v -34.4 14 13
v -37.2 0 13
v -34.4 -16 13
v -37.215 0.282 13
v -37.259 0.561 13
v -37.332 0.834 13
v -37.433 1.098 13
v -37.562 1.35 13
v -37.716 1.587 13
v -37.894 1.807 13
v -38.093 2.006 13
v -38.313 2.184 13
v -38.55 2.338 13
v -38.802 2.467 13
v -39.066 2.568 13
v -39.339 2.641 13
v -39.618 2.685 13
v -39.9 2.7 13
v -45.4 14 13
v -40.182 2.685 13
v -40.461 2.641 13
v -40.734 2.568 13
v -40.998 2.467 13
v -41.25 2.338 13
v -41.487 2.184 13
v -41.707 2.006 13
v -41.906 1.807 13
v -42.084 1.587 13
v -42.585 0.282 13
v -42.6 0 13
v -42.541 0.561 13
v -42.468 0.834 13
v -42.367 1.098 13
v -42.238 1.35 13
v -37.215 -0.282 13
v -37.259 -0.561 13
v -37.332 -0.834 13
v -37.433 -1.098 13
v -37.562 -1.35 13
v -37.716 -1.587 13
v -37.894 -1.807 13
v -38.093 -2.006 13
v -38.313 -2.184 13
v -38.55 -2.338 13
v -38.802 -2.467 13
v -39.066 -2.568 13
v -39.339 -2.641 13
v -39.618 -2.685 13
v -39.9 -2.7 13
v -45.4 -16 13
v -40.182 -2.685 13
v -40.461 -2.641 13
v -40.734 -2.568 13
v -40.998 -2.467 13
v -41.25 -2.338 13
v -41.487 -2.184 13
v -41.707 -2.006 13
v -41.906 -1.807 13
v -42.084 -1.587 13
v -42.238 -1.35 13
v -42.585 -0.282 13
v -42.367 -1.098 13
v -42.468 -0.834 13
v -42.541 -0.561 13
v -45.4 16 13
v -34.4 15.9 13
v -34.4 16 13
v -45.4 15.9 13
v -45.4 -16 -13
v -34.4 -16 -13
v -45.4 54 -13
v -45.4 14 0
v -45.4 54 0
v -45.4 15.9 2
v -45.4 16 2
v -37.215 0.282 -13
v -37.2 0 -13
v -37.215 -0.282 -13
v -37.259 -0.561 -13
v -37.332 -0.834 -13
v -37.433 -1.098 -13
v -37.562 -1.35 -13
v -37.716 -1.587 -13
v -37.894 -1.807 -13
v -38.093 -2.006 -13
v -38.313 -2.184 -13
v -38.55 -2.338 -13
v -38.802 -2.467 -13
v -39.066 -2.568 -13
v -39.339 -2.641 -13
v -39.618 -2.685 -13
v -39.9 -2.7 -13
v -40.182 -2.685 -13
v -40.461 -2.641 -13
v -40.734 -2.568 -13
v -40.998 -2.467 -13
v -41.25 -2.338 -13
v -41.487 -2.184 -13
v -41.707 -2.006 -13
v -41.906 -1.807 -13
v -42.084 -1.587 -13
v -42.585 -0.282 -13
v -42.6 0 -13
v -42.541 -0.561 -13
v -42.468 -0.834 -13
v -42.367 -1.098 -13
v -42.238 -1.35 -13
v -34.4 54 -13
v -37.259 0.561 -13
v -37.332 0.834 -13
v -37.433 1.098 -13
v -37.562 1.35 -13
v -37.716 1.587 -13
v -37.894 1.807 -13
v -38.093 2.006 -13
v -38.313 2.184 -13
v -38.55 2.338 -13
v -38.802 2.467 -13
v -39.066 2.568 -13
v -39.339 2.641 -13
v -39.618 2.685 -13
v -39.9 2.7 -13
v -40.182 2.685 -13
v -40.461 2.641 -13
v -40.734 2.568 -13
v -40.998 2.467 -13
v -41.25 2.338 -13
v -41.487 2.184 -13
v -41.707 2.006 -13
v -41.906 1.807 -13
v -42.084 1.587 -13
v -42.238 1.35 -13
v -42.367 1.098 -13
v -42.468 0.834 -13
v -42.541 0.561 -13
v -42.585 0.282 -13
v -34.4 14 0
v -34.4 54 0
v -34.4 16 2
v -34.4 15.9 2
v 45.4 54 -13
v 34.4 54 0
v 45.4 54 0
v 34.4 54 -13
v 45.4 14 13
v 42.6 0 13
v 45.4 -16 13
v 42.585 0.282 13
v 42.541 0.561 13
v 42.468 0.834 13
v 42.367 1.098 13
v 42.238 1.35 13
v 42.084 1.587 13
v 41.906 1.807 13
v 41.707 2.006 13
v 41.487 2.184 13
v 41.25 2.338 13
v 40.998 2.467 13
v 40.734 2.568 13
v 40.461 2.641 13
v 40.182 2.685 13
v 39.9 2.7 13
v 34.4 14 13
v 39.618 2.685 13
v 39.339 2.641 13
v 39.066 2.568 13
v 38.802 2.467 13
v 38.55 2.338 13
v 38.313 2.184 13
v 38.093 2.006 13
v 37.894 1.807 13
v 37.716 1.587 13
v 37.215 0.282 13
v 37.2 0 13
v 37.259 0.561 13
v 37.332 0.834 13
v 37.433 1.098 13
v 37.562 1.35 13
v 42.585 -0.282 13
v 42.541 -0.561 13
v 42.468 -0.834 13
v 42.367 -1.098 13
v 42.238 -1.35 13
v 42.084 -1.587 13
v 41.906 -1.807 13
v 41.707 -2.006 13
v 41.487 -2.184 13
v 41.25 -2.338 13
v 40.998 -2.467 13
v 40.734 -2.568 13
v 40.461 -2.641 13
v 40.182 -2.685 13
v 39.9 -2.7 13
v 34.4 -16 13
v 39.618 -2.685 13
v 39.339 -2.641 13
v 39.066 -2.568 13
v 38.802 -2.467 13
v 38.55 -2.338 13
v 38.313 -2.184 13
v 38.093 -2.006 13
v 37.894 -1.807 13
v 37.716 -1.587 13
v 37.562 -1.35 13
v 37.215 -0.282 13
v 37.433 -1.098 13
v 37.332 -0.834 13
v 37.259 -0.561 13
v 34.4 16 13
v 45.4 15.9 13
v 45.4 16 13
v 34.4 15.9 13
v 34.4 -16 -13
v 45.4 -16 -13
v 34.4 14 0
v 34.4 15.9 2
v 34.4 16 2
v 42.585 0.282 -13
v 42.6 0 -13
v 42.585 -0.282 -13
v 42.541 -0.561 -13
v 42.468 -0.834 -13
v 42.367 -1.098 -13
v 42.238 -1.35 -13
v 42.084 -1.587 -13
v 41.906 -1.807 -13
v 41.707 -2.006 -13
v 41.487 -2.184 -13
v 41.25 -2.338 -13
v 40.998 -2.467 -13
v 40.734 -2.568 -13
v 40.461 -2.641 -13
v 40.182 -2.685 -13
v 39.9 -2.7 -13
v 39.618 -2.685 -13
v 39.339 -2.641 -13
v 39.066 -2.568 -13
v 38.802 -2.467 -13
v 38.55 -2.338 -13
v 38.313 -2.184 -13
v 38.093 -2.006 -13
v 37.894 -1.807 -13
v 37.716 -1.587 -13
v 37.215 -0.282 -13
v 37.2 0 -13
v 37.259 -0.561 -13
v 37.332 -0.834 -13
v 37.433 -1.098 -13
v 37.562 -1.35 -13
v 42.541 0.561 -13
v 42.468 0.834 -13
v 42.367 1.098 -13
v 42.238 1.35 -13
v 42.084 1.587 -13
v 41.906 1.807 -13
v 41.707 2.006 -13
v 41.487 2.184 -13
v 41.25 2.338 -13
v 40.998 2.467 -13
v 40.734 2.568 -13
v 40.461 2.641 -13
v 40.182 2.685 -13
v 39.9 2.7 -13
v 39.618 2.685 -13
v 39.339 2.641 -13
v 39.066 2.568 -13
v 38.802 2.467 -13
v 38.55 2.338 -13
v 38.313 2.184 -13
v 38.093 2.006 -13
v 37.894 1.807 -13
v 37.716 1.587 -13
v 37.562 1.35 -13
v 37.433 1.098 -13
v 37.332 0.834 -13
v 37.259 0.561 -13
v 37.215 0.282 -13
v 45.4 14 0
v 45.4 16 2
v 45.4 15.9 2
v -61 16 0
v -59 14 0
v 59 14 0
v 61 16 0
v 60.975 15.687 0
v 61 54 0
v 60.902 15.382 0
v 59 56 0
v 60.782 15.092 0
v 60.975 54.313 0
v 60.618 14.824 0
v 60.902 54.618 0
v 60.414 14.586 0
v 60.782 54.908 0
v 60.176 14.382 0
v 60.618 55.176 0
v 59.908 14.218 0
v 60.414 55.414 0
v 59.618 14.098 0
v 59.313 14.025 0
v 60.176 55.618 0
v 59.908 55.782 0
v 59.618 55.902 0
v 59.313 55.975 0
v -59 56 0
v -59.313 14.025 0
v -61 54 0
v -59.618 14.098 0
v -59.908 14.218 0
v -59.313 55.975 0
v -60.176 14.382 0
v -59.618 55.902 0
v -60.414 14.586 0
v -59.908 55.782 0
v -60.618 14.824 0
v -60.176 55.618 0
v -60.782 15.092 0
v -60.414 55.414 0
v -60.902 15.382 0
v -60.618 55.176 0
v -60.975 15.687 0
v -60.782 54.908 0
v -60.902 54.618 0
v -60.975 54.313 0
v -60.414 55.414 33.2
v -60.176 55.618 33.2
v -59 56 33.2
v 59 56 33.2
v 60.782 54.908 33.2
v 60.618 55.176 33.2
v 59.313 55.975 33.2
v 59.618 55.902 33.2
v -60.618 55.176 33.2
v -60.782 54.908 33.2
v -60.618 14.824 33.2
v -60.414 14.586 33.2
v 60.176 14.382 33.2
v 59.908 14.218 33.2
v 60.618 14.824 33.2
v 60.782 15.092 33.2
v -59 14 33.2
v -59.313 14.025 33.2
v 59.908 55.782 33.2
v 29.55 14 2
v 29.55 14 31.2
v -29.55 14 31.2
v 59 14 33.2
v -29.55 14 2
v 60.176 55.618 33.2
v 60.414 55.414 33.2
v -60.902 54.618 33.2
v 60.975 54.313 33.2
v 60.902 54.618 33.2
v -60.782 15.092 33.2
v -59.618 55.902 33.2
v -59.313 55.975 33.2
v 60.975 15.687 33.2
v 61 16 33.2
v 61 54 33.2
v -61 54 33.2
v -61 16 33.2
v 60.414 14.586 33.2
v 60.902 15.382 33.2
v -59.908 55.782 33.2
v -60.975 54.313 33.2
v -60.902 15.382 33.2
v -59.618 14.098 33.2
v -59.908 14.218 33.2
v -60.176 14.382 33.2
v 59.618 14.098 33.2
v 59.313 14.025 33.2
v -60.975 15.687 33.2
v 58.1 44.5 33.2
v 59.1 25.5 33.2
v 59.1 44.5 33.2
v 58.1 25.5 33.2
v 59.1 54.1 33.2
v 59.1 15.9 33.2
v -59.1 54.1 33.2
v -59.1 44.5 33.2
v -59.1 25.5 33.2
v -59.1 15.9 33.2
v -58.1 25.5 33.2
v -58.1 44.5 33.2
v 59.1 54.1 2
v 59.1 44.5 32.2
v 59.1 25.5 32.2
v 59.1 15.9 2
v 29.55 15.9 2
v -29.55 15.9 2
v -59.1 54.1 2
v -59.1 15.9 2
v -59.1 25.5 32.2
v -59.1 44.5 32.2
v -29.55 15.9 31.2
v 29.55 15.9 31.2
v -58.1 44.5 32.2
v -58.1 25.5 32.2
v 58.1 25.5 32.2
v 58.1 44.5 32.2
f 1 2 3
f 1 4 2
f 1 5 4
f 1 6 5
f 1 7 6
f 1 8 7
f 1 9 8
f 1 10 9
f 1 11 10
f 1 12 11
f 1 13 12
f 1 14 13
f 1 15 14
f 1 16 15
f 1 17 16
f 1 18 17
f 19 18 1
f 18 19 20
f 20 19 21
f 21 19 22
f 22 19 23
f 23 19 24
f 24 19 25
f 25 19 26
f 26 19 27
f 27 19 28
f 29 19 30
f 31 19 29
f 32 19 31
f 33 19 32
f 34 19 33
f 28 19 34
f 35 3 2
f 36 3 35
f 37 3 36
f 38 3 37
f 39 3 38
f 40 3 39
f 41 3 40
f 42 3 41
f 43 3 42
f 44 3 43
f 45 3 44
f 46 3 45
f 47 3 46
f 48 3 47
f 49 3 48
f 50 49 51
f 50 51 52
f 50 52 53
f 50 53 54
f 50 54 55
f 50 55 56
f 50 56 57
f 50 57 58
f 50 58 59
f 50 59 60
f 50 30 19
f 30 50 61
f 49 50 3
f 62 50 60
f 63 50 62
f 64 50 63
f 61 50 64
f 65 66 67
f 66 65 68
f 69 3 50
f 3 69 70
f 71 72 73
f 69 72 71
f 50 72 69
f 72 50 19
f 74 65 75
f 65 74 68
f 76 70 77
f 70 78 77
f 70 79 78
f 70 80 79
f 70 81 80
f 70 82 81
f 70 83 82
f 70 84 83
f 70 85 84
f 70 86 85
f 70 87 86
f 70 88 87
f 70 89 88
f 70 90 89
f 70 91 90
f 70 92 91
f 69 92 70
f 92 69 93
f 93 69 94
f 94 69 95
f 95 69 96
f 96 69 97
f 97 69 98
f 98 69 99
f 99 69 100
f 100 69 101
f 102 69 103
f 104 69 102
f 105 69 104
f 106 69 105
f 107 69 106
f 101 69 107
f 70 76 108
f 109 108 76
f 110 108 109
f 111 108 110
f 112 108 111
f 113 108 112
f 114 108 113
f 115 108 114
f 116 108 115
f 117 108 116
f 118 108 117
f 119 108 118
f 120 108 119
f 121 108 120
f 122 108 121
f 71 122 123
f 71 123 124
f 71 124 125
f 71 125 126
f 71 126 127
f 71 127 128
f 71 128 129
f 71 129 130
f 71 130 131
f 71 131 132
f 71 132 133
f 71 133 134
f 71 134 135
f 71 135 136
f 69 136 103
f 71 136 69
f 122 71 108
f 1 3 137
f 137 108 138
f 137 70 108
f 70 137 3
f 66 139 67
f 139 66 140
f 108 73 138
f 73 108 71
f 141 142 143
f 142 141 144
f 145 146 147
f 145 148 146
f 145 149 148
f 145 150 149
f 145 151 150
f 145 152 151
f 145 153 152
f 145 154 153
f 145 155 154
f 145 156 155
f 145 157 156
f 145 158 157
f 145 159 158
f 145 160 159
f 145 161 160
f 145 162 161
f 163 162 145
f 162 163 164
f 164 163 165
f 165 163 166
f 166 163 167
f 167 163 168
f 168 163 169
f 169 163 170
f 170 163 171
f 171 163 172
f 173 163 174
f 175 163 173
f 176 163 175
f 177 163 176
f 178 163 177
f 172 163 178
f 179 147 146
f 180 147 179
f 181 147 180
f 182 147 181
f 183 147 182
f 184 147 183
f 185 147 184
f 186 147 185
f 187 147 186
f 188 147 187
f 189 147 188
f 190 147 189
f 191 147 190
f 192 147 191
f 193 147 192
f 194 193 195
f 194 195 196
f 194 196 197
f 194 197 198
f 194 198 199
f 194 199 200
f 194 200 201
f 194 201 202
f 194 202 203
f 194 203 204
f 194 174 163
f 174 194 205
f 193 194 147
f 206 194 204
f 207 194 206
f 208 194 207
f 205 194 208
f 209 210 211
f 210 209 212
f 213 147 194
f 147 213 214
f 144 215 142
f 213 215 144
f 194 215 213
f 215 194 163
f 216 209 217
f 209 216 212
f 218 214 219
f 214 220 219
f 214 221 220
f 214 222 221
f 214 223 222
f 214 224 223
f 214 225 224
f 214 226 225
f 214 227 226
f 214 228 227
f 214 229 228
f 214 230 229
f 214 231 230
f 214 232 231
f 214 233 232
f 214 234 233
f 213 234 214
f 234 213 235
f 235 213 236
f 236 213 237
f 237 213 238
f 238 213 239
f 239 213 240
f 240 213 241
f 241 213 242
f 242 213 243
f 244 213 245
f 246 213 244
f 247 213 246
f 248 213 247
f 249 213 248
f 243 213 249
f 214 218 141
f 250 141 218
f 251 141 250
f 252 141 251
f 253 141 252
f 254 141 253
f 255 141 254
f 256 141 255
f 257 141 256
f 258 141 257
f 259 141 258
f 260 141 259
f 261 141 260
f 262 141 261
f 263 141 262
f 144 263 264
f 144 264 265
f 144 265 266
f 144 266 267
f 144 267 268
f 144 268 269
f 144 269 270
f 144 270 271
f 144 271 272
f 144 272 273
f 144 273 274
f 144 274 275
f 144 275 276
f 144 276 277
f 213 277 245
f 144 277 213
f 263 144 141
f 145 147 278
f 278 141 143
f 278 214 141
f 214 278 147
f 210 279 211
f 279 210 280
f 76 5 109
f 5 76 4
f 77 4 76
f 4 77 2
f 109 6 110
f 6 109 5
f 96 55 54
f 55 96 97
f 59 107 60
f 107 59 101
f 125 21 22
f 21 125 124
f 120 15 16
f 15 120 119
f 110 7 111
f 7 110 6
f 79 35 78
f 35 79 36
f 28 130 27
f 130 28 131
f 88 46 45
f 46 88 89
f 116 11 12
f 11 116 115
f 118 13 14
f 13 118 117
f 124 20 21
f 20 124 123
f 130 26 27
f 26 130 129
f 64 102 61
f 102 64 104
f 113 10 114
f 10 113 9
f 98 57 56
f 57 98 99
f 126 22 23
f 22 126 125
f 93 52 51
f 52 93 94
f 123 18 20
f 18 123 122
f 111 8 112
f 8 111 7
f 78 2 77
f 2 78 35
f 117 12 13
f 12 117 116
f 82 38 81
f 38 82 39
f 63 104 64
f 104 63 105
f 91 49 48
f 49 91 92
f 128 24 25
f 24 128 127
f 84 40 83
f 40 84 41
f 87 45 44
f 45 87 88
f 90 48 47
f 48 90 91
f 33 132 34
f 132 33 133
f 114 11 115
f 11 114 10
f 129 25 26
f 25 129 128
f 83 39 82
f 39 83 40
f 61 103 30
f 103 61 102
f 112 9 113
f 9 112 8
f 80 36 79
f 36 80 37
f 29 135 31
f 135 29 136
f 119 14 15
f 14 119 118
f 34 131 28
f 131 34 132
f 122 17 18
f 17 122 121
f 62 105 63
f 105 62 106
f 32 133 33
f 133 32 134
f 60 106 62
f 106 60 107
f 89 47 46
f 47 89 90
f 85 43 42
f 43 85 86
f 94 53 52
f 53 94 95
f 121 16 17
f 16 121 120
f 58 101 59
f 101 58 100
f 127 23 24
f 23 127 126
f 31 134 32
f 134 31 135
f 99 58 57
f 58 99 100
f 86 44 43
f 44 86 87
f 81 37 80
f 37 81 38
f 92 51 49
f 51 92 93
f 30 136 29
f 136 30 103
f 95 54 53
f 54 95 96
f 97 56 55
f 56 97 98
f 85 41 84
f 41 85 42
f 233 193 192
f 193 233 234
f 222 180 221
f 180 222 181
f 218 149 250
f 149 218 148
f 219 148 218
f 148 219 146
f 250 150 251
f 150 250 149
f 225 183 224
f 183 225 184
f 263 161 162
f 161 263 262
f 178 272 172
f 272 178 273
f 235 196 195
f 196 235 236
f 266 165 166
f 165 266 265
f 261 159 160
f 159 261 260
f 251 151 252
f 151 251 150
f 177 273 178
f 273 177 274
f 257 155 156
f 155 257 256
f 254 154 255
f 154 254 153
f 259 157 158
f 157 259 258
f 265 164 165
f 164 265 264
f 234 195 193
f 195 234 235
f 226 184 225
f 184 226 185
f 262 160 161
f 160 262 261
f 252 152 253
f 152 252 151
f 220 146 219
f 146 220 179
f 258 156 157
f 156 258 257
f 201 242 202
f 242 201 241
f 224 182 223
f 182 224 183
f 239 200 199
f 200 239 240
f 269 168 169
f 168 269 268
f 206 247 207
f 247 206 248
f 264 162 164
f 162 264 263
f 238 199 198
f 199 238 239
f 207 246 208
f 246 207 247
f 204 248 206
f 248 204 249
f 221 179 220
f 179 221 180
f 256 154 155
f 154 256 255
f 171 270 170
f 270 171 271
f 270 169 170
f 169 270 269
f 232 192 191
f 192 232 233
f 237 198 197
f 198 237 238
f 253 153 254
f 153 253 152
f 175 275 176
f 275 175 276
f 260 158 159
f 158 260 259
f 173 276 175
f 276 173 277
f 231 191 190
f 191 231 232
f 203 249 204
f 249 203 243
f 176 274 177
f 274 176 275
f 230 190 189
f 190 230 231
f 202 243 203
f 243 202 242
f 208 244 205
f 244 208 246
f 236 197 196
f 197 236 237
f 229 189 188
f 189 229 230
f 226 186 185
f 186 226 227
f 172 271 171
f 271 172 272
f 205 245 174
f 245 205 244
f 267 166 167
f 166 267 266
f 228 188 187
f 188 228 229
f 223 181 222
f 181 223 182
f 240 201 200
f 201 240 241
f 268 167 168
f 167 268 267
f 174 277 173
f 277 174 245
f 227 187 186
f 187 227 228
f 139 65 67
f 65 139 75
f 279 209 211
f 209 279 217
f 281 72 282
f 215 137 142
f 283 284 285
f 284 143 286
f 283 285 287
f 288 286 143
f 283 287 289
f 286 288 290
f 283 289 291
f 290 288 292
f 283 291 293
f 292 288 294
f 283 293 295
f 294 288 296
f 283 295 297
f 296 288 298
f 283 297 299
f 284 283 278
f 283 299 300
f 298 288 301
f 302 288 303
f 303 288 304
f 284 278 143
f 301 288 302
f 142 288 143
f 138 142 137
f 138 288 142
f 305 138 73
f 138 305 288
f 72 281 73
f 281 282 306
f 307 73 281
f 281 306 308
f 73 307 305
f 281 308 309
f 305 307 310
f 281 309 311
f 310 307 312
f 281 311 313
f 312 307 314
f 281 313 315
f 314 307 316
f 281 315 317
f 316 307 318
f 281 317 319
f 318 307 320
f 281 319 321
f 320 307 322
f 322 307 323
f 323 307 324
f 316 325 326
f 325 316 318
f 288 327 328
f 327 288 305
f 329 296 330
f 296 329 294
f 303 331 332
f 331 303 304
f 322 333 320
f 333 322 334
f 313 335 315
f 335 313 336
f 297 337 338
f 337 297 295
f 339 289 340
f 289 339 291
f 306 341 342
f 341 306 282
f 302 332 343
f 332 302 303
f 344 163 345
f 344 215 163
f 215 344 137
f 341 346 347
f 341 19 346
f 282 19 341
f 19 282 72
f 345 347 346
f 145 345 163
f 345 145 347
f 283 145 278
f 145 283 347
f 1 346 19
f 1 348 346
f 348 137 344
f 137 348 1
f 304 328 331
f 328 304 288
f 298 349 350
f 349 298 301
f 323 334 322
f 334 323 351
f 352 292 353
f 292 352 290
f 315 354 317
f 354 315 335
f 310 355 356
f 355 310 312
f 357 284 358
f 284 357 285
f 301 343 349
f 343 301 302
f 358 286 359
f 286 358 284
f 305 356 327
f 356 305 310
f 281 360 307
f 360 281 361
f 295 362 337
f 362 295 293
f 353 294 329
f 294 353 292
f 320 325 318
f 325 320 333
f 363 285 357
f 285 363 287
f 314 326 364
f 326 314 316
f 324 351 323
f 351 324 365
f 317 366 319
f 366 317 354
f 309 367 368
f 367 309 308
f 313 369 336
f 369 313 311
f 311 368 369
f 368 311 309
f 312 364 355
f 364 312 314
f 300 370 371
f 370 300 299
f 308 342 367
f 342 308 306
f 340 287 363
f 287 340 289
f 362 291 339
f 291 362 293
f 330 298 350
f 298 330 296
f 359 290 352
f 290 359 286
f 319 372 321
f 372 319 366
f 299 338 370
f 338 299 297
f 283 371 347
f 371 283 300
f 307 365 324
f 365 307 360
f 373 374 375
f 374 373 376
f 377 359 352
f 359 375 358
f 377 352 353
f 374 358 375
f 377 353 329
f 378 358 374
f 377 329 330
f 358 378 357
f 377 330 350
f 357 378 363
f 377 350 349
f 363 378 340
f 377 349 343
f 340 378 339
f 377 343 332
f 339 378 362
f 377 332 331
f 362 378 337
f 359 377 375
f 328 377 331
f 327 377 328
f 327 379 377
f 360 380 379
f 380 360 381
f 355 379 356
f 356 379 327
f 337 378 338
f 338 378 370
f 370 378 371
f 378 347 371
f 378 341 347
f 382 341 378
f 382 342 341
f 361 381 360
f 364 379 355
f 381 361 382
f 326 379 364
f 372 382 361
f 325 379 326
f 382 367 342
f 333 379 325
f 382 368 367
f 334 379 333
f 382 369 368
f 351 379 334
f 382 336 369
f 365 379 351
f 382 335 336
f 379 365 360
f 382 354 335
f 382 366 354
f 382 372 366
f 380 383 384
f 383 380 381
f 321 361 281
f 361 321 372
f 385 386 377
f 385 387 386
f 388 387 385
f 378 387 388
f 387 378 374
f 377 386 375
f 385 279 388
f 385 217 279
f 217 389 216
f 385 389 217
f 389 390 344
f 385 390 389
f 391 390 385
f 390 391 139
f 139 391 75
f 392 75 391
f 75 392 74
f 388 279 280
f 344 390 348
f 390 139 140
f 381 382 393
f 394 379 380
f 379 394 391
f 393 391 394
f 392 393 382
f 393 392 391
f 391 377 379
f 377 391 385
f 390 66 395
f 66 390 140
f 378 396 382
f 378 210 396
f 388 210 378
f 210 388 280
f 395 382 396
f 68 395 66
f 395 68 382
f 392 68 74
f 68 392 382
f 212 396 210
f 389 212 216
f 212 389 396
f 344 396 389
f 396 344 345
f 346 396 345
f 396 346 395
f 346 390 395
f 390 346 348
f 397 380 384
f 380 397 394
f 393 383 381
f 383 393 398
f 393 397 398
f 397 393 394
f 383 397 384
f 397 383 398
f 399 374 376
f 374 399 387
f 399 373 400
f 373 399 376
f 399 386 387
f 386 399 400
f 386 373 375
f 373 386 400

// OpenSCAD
// SKY-FOLD-10 — SkyRelay Conduit Holder
// Mount for the skyrelay conduit on the drone frame.

//include <../skyrelay/skyrelay_enclosure_v4-base-model.scad>

$fn = 60;

// --- holder() — from eazl.scad ---
module holder(
    dim_length=20,
    dim_width=10,
    dim_height=5,
    open_pct=80,
    thickness=1.5,
    spacing=0.1,
    lips=false
    ) {

    radius=2;
    print_spacing = spacing * 2;

    inner_length = dim_length + print_spacing;
    inner_width  = dim_width  + print_spacing;
    inner_dim_height = dim_height;

    outer_length = dim_length + 2*thickness;
    outer_width  = dim_width  + 2*thickness;
    outer_height = dim_height + thickness;

    open_width = inner_length * open_pct / 100;

    translate([0,0,0]) {
        difference() {
            // Outer tray shape
            hull() {
                for (x = [-outer_length/2 + radius, outer_length/2 - radius])
                    for (y = [-outer_width/2 + radius, outer_width/2 - radius])
                        translate([x,y,0])
                            cylinder(r=radius, h=outer_height, $fn=40);
            }

            // Inner cutout
            translate([-inner_length/2,-inner_width/2,thickness])
                cube([inner_length,inner_width,dim_height+0.1]);

            // Opening on one side
            translate([0, -outer_width/2+thickness/2 , outer_height/2])
                cube([open_width, thickness+0.1, dim_height-thickness], center=true);
        }
        if (lips) {
            rotate([0,0,90]) translate([0, (inner_length-1)/2, dim_height+thickness-0.5])
                cube([dim_width/2,1,1], center=true);
            rotate([0,0,90]) translate([0,-(inner_length-1)/2, dim_height+thickness-0.5])
                cube([dim_width/2,1,1], center=true);
        }
    }
}


// --- Frame standoff specs ---
STANDOFF_BASE_INNER_SPACING = 74;
STANDOFF_BASE_DIAMETER      = 5.4;
STANDOFF_BASE_HEIGHT        = 26;
STANDOFF_CENTER_X = STANDOFF_BASE_INNER_SPACING/2 + 2*1.5 - 0.1;  // 40.4mm

// --- Bar geometry ---
BAR_LENGTH     = 70;   // bar length along Y
BAR_WIDTH      = 11;   // bar width along X
HOLE_FROM_END  = 16;   // distance from the -Y end of the bar to the hole centre
                       //  (27 = centred; <27 puts hole closer to -Y end, >27 closer to +Y end)

// Shift so the standoff hole ends up at the standoff position, not bar centre
BAR_Y_SHIFT = BAR_LENGTH/2 - HOLE_FROM_END;
    // --- Case hull (simplified outline of the SkyRelay v4 enclosure) ---
    CASE_X = 118;   // outer length (box_inner_x=114 + 2*wall_thickness)
    CASE_Y = 38;    // outer width (board_width=33 + 2*pcb_tolerance + 2*wall_thickness)
    CASE_Z = 31.2;  // outer height (box_interior_height=28 + wall_bot + wall_top)
    CASE_R = 3;     // corner radius
    CASE_POS_Y = 35; // Y offset of case (relative to standoff line)
    CASE_POS_Z = 0;  // sits on top of the bars

difference(){
    union(){
        //port bar
        translate([-STANDOFF_CENTER_X, BAR_Y_SHIFT, 0])
            rotate([0,0,90])
                cube([BAR_LENGTH, BAR_WIDTH, STANDOFF_BASE_HEIGHT], center=true);

        //starboard bar
        translate([STANDOFF_CENTER_X, BAR_Y_SHIFT, 0])
            rotate([0,0,90])
                cube([BAR_LENGTH, BAR_WIDTH, STANDOFF_BASE_HEIGHT], center=true);
    }

    // Case hull cut
    translate([0, CASE_POS_Y, CASE_POS_Z])
        linear_extrude(CASE_Z)
            offset(r = CASE_R) offset(delta = -CASE_R)
                square([CASE_X, CASE_Y], center = true);

    // Standoff holes — cut through everything including the bars and any
    // overlapping structure above
    for (sx = [-STANDOFF_CENTER_X, STANDOFF_CENTER_X])
        translate([sx, 0, -STANDOFF_BASE_HEIGHT])
            cylinder(h = STANDOFF_BASE_HEIGHT * 3, d = STANDOFF_BASE_DIAMETER);
}


translate([0, CASE_POS_Y, CASE_POS_Z])
holder(CASE_X, CASE_Y, CASE_Z, open_pct=50, thickness=2, spacing=0.1, lips=true);
